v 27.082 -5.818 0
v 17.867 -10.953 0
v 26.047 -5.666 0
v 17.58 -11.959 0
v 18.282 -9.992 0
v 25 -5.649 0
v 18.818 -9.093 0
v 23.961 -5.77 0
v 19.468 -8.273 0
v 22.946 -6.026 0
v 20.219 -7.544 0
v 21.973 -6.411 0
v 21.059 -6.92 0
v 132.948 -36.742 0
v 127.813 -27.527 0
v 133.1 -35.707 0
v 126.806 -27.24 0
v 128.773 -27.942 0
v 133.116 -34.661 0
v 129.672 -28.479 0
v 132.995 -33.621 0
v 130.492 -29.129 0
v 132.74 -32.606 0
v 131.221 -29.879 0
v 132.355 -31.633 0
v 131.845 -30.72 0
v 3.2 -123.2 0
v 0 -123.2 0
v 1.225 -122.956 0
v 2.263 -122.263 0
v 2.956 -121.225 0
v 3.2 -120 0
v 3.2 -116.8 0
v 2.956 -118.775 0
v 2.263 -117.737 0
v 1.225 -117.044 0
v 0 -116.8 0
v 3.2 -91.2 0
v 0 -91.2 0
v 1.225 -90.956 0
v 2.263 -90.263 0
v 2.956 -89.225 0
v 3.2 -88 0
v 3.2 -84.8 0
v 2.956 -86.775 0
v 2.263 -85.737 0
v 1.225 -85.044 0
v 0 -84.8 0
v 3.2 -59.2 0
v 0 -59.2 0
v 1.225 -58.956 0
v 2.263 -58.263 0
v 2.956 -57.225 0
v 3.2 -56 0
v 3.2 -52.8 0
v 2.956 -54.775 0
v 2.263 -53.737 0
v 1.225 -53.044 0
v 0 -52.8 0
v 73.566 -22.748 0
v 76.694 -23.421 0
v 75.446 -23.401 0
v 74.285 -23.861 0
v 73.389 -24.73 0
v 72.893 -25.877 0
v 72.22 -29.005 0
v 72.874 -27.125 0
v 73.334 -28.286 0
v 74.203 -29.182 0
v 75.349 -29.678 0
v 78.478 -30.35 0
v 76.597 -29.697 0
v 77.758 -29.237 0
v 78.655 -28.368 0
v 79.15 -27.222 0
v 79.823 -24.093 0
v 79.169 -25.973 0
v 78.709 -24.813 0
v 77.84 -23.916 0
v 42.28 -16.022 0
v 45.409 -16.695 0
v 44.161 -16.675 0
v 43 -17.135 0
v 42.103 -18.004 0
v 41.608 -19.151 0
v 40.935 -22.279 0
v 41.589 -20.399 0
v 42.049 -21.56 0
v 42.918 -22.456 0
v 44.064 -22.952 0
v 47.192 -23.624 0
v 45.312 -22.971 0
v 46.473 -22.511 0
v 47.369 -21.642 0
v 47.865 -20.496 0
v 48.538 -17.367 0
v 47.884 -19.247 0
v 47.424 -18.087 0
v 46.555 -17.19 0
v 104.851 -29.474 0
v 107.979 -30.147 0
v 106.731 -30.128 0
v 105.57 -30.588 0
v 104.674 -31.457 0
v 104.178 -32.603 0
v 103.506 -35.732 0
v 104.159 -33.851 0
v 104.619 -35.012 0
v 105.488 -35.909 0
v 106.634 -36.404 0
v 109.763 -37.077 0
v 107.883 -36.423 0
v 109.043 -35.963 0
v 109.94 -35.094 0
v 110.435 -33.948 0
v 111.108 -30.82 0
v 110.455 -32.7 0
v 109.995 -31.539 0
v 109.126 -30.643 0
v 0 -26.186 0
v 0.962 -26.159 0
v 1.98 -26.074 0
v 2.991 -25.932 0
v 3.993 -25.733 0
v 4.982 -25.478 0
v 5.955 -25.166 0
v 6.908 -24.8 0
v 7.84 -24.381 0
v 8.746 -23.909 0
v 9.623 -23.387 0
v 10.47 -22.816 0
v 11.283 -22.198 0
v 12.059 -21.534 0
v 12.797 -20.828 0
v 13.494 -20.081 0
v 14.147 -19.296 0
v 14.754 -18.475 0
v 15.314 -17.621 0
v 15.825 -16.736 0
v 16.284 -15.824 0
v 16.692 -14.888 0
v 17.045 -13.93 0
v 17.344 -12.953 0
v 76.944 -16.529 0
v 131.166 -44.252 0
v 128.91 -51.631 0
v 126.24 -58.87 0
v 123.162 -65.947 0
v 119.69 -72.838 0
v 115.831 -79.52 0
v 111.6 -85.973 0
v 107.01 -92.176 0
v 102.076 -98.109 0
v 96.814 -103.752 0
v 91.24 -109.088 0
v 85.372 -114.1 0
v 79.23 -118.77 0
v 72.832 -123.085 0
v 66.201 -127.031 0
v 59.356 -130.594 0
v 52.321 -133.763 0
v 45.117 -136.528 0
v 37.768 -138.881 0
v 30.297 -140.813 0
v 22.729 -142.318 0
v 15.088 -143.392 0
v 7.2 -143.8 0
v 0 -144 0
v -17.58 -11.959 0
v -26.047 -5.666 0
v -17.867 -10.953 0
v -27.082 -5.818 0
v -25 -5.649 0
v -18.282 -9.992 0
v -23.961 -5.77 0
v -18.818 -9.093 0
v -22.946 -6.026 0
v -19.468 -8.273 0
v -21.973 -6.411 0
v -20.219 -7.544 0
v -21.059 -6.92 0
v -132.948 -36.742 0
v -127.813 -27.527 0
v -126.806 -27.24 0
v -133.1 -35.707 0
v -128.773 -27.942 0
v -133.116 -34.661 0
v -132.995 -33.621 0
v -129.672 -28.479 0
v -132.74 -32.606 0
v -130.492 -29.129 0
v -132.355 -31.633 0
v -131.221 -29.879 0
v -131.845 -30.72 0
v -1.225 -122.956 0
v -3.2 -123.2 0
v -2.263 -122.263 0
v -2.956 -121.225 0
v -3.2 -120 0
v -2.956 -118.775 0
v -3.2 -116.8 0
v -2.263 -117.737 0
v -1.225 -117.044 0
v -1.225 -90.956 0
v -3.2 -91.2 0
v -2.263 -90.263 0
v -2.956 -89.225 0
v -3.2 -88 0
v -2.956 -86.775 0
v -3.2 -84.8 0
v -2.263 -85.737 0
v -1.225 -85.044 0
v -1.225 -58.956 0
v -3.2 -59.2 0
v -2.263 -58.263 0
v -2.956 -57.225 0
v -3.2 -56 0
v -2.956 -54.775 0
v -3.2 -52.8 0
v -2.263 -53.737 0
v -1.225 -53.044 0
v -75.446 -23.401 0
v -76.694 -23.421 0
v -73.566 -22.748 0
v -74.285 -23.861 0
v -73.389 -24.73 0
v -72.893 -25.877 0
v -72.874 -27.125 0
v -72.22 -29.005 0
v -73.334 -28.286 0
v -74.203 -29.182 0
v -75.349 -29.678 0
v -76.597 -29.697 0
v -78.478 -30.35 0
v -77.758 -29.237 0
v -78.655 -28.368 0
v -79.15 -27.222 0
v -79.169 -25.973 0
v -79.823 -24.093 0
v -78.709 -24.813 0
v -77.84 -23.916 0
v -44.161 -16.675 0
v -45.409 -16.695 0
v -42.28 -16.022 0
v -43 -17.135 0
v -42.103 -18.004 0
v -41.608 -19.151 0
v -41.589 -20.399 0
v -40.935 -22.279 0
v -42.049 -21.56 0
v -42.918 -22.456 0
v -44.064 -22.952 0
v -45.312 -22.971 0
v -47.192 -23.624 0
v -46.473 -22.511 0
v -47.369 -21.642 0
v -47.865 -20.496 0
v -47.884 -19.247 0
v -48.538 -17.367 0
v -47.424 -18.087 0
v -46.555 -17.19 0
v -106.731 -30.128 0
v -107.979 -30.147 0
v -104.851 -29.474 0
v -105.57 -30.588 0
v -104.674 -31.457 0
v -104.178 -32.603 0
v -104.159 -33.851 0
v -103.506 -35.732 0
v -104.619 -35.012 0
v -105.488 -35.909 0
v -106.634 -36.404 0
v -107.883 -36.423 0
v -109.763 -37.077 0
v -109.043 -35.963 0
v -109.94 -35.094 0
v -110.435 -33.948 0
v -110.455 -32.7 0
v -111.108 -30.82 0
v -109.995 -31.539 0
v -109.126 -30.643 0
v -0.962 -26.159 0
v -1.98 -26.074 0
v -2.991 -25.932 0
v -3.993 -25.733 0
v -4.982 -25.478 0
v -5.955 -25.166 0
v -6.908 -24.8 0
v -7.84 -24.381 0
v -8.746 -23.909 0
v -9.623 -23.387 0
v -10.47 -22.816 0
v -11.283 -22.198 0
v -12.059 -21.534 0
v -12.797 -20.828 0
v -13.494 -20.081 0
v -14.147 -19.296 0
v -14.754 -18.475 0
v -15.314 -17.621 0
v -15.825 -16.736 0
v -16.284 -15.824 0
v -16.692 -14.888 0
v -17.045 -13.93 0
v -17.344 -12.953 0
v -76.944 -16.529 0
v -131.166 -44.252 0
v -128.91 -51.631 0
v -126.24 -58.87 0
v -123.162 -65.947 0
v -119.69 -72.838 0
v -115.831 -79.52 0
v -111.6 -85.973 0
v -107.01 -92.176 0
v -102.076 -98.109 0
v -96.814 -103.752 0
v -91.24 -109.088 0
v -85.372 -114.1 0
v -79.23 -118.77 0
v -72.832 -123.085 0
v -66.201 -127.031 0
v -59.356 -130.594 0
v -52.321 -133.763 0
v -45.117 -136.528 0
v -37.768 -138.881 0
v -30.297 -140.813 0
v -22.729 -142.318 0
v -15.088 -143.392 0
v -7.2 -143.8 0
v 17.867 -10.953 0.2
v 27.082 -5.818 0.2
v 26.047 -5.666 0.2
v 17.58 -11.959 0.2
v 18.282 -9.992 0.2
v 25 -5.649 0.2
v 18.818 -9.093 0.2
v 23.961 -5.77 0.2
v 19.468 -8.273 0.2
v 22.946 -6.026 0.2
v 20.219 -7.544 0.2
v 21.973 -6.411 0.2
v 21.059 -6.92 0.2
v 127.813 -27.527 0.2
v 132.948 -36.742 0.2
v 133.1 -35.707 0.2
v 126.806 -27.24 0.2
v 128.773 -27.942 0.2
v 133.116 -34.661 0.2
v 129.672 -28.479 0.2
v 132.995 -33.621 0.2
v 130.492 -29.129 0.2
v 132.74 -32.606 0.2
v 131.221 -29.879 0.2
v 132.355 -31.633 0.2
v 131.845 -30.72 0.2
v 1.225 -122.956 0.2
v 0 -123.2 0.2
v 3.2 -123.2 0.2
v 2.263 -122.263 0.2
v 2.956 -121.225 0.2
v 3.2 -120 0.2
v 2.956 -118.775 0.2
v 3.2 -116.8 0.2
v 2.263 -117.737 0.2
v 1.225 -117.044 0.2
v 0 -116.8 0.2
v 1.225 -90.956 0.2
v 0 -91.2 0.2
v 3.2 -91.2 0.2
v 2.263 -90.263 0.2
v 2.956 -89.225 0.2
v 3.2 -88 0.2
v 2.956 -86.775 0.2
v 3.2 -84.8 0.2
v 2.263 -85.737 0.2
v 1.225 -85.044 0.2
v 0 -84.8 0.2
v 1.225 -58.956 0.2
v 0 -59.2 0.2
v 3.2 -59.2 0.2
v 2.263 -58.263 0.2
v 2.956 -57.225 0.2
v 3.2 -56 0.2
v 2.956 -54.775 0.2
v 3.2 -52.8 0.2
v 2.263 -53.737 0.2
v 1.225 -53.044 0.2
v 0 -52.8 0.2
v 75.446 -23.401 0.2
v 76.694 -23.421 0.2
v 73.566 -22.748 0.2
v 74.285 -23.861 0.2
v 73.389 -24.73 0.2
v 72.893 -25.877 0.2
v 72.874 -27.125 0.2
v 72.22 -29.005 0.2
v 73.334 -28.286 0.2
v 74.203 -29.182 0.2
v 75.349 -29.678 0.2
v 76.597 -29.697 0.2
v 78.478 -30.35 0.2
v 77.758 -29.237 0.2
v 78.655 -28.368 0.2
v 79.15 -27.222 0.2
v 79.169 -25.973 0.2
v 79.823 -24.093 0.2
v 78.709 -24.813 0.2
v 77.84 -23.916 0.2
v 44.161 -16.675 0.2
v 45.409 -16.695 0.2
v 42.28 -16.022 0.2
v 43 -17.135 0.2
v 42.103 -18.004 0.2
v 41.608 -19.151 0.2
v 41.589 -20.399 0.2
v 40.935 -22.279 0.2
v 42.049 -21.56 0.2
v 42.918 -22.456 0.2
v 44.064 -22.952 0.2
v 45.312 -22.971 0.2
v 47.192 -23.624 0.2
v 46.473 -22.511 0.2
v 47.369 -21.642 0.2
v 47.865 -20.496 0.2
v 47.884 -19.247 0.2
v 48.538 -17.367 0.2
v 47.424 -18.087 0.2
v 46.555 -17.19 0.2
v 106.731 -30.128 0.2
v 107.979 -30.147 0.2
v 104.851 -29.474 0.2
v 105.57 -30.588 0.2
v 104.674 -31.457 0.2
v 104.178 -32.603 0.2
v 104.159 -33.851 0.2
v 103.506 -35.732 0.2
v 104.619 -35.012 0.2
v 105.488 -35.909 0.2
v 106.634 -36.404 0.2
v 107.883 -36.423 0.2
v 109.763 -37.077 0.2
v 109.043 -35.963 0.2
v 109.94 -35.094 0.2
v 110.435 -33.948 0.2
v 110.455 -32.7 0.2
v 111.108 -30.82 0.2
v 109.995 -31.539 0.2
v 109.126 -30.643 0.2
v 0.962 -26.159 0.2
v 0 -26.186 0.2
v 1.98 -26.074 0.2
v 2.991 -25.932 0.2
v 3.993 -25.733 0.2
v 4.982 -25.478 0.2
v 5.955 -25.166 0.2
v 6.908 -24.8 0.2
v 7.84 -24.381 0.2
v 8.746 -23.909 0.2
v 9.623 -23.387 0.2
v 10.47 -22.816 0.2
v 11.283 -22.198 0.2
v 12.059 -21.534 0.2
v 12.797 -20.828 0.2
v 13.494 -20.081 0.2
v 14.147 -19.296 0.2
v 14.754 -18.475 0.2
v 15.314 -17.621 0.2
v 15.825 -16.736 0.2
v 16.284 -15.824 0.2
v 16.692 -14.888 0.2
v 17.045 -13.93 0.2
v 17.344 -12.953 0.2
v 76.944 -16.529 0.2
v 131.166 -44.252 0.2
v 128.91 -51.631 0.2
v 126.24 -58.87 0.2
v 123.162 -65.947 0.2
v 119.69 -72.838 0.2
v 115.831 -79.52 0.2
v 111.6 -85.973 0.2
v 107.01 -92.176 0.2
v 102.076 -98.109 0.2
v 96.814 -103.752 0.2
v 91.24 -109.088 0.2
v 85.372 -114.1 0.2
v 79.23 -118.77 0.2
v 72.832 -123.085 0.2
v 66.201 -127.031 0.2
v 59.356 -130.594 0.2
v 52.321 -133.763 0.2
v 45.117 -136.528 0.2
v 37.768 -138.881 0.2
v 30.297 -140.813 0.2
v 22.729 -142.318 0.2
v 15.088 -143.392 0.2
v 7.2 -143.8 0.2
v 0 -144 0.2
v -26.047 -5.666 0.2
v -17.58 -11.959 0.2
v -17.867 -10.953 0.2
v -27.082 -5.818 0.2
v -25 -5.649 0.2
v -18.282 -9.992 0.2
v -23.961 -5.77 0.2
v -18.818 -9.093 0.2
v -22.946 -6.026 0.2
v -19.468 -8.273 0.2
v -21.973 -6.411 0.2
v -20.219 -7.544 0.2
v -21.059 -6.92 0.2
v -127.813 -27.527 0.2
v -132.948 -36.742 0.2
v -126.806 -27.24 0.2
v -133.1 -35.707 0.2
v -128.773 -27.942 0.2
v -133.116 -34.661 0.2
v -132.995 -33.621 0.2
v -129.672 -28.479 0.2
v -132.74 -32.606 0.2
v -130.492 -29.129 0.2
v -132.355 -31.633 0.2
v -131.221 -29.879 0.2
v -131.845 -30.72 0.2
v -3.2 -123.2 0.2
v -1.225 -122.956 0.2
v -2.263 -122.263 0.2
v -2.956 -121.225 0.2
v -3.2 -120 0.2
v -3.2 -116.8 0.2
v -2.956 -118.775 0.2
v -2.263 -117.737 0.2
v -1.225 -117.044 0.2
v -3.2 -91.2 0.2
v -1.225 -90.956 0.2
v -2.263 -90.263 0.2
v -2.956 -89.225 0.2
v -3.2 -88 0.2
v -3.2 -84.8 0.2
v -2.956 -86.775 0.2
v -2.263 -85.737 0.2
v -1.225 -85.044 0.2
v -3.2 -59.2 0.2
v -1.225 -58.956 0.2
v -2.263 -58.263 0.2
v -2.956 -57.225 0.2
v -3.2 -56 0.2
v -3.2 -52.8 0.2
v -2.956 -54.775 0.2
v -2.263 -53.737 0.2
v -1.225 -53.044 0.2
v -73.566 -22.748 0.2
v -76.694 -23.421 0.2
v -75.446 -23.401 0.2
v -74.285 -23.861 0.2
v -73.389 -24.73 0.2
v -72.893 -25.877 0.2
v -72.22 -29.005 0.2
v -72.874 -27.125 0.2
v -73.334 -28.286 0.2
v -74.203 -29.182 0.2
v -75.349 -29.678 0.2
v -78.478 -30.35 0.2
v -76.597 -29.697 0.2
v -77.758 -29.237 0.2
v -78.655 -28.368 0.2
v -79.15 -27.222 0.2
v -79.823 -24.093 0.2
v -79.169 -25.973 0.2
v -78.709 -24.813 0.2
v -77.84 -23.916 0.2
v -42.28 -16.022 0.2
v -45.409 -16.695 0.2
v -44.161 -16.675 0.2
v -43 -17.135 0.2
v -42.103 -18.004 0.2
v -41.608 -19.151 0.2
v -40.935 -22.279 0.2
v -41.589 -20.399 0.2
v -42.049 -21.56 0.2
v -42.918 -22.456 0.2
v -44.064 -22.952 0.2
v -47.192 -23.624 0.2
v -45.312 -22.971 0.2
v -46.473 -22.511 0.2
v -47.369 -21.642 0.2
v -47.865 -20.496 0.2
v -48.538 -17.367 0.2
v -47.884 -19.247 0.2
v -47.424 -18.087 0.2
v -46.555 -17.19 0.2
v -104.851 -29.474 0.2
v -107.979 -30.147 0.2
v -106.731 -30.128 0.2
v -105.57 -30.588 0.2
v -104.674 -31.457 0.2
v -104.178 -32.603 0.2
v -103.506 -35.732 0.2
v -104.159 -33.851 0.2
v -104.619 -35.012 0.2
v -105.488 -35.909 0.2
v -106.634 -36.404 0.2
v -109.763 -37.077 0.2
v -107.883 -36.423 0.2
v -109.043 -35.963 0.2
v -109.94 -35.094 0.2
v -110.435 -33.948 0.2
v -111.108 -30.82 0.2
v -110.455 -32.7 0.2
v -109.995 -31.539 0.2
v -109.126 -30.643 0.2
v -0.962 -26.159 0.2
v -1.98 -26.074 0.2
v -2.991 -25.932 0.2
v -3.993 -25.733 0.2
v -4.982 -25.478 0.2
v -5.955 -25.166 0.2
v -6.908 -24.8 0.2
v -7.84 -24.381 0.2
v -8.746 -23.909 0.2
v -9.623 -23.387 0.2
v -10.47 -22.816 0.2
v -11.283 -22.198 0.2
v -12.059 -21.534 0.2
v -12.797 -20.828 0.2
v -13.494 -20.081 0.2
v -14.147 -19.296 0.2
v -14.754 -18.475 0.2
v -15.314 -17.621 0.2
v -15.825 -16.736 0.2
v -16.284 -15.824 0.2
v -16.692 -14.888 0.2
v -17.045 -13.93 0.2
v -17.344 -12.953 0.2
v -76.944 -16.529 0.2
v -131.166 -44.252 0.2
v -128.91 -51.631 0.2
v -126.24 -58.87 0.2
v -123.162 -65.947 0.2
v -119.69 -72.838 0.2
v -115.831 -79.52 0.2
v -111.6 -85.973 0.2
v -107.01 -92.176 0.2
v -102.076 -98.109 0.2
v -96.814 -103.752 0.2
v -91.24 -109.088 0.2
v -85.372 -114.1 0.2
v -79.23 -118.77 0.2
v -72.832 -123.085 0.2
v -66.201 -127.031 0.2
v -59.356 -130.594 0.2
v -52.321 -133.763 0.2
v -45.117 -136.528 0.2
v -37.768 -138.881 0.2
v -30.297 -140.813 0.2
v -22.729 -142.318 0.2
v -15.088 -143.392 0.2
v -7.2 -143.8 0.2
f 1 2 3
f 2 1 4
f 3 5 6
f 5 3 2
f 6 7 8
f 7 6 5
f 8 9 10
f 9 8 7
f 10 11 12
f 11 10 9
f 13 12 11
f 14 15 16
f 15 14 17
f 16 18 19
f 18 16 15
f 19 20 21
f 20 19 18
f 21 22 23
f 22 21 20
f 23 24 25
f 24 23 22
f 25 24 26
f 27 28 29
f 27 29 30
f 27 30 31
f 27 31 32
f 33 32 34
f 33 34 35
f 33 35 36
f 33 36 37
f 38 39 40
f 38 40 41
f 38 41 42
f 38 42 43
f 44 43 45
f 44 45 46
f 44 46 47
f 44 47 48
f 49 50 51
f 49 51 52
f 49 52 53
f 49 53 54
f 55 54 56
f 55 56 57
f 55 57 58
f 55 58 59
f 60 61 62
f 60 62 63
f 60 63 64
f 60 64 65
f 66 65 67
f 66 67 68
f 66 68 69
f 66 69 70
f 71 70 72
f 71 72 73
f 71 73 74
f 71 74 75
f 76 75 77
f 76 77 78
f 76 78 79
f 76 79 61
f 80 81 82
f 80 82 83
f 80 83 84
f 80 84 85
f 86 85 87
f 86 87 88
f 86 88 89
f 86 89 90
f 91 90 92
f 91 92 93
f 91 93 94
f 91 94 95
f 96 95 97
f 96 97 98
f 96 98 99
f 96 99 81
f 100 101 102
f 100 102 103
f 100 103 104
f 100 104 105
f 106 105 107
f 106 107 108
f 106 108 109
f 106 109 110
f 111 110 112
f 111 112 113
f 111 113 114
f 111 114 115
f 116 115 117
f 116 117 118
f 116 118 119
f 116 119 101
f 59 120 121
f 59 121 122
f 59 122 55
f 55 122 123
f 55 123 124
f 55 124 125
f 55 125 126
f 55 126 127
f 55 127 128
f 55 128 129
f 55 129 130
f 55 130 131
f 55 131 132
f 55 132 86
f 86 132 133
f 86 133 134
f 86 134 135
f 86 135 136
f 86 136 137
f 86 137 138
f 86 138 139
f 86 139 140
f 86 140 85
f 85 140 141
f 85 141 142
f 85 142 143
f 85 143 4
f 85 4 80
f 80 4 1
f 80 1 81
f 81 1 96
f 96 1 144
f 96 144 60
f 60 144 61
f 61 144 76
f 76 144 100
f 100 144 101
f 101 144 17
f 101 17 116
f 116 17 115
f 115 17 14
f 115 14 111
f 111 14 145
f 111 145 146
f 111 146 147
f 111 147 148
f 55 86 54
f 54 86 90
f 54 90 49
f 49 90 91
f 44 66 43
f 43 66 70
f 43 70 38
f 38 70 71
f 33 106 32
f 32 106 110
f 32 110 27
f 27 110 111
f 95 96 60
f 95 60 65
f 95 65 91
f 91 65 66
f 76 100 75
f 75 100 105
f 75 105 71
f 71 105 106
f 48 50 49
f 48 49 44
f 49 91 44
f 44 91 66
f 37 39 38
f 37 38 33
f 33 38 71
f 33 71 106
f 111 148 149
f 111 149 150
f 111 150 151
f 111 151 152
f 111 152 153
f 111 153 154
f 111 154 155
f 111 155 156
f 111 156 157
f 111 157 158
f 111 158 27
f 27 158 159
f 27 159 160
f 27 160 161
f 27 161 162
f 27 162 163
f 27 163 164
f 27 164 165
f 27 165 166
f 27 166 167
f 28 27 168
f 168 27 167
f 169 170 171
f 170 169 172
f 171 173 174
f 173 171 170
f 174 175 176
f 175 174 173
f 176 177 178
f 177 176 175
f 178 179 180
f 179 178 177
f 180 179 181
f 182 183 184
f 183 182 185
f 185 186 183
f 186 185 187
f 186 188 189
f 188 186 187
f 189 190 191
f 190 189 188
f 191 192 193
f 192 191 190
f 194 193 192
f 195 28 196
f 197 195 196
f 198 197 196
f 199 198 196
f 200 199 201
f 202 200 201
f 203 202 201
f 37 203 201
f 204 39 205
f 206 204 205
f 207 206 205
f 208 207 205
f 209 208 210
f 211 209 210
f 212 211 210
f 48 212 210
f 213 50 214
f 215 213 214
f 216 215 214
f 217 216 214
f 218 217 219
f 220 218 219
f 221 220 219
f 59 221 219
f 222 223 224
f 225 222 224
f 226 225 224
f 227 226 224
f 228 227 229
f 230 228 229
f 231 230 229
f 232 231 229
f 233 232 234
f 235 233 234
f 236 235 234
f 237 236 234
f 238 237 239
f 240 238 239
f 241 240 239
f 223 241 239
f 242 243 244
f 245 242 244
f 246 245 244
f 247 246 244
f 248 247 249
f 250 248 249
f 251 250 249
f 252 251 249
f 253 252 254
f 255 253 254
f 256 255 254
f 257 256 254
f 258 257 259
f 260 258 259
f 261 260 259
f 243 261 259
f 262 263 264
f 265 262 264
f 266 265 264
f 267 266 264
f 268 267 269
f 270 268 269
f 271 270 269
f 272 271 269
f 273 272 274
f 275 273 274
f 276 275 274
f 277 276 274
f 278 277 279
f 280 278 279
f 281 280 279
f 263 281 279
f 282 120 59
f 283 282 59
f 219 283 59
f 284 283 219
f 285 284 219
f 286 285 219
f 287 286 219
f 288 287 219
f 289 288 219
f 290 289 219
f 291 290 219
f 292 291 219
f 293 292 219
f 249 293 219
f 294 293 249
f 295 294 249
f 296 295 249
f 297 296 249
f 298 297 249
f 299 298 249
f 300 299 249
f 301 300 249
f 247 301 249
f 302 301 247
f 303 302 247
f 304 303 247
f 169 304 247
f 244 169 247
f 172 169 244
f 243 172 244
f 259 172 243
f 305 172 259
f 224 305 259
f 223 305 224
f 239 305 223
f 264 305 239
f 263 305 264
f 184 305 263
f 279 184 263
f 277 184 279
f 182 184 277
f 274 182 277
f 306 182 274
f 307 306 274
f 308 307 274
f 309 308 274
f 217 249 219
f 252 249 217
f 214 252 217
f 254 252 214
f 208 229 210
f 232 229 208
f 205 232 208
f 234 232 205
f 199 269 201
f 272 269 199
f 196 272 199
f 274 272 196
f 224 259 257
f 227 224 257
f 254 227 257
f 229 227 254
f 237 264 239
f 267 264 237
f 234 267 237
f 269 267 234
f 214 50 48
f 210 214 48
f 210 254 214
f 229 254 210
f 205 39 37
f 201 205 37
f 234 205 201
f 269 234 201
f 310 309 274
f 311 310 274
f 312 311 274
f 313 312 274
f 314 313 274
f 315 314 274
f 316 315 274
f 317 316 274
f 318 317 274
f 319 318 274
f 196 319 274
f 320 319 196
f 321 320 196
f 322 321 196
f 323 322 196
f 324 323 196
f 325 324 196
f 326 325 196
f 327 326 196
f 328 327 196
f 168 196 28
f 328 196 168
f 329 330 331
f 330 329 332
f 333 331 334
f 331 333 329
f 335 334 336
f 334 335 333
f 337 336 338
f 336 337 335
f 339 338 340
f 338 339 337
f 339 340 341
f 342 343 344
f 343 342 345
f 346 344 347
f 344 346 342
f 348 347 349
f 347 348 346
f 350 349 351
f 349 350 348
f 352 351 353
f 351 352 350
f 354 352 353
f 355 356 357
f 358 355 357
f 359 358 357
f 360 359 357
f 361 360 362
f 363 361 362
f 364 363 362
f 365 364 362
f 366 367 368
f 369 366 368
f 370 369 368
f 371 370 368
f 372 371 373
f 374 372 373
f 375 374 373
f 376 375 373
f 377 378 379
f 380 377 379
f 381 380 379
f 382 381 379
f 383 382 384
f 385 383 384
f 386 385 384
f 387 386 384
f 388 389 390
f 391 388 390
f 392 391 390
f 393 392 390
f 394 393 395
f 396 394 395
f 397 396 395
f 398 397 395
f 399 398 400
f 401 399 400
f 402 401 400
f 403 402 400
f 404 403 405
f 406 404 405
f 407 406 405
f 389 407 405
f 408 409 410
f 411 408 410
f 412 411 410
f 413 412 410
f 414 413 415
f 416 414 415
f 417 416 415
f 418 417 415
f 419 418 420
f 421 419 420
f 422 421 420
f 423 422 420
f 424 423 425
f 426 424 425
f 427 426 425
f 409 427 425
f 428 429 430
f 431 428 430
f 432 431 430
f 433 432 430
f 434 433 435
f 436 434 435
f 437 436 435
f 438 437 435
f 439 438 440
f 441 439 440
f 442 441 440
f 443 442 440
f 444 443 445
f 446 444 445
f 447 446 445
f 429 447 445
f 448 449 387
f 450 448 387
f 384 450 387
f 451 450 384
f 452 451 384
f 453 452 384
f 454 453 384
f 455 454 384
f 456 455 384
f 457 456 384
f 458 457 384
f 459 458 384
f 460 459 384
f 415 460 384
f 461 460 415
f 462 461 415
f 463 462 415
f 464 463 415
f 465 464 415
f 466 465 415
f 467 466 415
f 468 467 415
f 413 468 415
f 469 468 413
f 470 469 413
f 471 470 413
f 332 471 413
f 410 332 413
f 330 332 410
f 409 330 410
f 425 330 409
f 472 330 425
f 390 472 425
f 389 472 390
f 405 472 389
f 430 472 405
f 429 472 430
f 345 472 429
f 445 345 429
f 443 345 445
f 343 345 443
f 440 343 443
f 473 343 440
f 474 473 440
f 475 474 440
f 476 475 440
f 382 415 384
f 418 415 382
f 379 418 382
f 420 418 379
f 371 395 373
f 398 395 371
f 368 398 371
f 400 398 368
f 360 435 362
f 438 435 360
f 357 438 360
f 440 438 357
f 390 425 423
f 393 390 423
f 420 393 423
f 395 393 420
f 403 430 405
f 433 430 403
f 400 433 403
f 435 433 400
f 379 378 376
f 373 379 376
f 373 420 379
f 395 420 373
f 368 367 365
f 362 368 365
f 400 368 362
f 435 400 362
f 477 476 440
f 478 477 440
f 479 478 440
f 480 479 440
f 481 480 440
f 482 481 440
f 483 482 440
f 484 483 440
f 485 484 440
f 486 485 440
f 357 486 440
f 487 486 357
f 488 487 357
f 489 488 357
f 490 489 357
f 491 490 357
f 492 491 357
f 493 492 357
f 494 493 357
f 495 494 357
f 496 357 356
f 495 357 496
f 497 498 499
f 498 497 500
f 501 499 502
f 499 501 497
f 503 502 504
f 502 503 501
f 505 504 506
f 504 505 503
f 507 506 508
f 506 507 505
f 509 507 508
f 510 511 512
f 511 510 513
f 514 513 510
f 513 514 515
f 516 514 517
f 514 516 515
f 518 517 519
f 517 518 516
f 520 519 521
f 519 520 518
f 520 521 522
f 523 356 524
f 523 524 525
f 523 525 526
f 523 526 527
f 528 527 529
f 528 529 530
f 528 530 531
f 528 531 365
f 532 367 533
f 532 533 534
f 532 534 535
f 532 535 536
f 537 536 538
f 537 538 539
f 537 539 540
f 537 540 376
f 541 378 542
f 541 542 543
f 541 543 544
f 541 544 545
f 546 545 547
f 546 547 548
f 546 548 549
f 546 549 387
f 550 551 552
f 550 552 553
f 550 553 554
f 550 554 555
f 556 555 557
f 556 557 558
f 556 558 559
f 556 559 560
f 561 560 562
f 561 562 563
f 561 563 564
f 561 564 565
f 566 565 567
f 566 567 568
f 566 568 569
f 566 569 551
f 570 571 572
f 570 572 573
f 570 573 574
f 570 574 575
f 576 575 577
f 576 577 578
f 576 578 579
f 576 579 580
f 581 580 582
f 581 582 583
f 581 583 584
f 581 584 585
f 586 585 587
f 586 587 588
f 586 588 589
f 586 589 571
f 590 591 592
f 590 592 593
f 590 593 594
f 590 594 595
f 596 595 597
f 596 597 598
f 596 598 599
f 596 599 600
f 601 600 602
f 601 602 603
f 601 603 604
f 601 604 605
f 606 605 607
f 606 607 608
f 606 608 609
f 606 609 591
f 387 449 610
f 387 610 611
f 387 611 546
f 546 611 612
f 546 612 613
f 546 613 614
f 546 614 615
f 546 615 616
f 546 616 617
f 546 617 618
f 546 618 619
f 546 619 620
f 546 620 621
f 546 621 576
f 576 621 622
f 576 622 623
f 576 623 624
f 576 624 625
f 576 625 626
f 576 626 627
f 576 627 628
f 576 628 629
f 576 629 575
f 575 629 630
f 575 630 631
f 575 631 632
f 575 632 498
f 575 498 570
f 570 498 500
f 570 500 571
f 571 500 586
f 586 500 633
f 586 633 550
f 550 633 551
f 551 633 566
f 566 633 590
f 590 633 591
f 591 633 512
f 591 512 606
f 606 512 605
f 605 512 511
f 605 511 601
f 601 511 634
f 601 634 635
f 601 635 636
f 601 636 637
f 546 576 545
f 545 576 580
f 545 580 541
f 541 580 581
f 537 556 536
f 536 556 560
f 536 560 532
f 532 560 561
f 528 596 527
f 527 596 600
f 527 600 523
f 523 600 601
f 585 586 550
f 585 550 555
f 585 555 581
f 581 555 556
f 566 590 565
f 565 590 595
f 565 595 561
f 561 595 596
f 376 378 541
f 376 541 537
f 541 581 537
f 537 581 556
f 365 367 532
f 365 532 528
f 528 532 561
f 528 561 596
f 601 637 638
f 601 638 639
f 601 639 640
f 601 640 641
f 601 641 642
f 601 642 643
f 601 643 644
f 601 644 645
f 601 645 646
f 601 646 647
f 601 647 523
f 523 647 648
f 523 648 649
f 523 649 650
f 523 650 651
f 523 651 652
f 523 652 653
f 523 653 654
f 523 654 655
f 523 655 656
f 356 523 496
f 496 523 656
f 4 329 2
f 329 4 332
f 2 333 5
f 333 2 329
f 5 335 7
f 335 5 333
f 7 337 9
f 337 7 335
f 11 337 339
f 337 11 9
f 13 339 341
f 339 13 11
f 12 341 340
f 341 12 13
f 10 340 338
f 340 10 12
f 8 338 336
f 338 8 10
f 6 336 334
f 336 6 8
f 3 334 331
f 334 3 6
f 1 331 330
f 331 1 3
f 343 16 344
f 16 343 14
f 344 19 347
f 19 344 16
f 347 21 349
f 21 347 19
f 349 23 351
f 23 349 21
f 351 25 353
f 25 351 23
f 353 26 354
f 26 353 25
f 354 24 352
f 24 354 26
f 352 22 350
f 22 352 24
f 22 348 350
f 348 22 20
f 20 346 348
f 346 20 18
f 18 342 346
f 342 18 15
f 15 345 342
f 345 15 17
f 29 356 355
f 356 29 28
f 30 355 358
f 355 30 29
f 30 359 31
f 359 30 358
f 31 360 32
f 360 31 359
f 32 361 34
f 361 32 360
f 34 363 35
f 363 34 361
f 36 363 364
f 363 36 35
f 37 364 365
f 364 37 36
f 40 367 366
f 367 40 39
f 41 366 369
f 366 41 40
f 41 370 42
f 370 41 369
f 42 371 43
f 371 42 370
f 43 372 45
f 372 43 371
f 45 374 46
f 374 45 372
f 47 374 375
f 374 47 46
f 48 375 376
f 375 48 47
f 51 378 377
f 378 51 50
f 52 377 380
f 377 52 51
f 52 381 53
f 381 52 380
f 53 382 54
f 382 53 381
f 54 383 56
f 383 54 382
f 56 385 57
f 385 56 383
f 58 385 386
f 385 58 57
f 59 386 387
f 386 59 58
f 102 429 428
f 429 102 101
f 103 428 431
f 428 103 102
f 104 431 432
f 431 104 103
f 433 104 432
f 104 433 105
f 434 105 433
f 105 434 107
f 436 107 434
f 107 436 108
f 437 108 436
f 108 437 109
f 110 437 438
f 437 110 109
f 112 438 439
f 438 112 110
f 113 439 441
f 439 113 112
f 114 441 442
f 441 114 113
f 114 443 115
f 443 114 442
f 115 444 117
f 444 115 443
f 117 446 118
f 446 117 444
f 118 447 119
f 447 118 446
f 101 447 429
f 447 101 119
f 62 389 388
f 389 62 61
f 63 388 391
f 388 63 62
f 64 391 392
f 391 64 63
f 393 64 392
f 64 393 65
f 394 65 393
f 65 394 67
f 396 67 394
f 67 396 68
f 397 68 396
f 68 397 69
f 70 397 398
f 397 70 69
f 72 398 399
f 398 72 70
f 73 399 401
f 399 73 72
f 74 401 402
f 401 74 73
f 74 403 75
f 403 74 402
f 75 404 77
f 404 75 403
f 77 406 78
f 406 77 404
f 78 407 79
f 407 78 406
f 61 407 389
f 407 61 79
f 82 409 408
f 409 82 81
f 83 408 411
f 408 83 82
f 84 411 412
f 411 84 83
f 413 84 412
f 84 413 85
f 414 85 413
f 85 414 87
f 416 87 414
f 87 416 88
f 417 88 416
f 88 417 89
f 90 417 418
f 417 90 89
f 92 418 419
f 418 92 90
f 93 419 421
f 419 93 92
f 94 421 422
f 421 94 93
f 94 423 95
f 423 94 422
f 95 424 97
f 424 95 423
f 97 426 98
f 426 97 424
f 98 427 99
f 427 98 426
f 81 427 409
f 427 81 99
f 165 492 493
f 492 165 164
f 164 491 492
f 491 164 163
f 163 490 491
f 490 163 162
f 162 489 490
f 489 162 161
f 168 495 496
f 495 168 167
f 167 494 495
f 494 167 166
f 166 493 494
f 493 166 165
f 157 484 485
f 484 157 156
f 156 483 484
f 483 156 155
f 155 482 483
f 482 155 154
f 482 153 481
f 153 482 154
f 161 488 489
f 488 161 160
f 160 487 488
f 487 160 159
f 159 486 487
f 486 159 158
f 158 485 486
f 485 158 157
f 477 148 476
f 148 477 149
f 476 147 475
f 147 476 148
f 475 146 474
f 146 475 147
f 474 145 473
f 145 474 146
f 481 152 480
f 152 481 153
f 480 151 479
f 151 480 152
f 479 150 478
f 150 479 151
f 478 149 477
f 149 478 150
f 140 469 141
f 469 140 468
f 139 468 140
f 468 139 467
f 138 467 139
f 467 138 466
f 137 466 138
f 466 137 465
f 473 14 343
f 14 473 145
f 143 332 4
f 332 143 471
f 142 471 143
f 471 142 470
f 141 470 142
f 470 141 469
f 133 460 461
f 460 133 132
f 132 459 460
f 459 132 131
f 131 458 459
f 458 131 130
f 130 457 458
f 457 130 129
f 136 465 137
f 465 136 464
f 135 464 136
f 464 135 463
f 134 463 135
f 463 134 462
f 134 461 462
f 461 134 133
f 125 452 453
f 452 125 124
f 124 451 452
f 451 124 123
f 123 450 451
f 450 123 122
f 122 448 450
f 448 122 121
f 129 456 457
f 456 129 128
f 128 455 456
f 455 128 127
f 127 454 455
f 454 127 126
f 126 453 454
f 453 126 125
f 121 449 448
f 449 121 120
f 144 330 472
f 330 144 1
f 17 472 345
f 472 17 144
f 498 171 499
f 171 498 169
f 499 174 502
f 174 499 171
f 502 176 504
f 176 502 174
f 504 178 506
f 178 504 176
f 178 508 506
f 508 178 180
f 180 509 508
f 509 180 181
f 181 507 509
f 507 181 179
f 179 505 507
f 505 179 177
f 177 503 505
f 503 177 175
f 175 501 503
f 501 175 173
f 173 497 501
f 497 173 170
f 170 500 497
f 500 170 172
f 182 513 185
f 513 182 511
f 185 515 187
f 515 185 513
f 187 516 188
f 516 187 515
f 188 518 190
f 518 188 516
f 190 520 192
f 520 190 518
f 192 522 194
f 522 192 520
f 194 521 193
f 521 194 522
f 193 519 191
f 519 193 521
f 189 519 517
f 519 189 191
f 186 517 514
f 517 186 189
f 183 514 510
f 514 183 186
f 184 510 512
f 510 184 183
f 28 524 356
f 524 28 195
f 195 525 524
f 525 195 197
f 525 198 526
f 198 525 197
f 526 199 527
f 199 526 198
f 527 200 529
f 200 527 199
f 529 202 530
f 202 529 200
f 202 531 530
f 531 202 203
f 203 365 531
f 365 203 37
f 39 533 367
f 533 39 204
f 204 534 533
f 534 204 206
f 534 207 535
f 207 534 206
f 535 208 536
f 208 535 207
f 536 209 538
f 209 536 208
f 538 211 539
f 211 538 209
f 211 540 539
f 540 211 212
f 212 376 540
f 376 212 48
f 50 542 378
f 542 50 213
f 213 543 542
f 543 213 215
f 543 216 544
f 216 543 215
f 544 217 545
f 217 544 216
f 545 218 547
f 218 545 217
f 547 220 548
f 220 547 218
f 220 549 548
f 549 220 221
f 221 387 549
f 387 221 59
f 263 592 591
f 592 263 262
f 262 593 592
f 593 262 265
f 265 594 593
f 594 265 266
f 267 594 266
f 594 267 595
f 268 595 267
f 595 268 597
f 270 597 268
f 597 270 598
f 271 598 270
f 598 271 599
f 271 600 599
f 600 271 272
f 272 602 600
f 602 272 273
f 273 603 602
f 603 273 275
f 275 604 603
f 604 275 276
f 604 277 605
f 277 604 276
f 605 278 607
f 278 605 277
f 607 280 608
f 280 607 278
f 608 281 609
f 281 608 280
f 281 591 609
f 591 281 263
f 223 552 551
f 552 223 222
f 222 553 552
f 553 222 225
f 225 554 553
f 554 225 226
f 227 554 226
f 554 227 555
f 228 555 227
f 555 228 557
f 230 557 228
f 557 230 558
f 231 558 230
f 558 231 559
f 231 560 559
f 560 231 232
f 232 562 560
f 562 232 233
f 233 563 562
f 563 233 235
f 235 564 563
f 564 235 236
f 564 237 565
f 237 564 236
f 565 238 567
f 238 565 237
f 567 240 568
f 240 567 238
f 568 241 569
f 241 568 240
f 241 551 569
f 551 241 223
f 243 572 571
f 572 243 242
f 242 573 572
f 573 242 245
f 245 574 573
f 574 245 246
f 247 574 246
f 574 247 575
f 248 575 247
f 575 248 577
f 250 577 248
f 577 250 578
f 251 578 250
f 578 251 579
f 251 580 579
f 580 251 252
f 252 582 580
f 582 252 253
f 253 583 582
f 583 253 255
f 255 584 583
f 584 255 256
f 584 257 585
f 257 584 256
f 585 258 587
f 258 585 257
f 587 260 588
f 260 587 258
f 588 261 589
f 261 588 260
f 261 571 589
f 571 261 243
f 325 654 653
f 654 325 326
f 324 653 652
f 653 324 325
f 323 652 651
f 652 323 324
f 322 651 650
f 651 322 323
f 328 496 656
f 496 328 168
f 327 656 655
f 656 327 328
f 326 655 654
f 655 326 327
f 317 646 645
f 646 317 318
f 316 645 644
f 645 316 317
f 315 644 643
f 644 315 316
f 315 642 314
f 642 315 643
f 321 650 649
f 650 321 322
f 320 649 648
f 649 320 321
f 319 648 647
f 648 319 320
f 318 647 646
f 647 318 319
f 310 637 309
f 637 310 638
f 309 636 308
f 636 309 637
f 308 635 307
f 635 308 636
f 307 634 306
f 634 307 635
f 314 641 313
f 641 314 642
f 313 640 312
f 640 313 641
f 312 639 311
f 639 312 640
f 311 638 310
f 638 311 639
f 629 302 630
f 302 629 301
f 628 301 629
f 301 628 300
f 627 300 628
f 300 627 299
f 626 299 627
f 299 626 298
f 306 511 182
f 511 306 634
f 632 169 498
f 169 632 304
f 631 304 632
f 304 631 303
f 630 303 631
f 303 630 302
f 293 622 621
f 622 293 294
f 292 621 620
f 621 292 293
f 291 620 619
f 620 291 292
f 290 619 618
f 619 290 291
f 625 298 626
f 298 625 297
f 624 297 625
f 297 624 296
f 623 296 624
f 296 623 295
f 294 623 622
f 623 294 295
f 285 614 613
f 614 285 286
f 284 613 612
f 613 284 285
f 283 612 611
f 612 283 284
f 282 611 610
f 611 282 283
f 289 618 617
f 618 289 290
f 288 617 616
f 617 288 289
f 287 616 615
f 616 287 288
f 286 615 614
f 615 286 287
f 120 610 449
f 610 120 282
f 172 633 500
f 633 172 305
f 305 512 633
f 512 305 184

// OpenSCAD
use <../lib.scad>
use <../p/48/11-24edge.scad>
use <../p/48/19-48edge.scad>
use <s/u9328as01.scad>
use <s/u9328as02.scad>
function ldraw_lib__u9328a() = [
// 0 Sheet Fabric Tepee Cover
// 0 Name: u9328a.dat
// 0 Author: Alex Taylor [anathema]
// 0 !LDRAW_ORG Part UPDATE 2024-10
// 0 !LICENSE Licensed under CC BY 4.0 : see CAreadme.txt
// 
// 0 BFC CERTIFY CCW
  [0,"BFC","CERTIFY"],
  [0,"BFC","CCW"],
// 
// 0 !CATEGORY Sheet Fabric
// 
// 0 !HISTORY 2024-05-18 [Holly-Wood] Split sub in half
// 0 !HISTORY 2024-12-01 [OrionP] Official Update 2024-10
// 
// 1 16 0 0 0 1 0 0 0 1 0 0 0 1 s\u9328as01.dat
  [1,16,0,0,0,1,0,0,0,1,0,0,0,1, ldraw_lib__s__u9328as01()],
// 1 16 0 0 0 -1 0 0 0 1 0 0 0 1 s\u9328as01.dat
  [1,16,0,0,0,-1,0,0,0,1,0,0,0,1, ldraw_lib__s__u9328as01()],
// 
// 1 16 0 -0.5 0 1 0 0 0 -1 0 0 0 1 s\u9328as01.dat
  [1,16,0,-0.5,0,1,0,0,0,-1,0,0,0,1, ldraw_lib__s__u9328as01()],
// 1 16 0 -0.5 0 -1 0 0 0 -1 0 0 0 1 s\u9328as01.dat
  [1,16,0,-0.5,0,-1,0,0,0,-1,0,0,0,1, ldraw_lib__s__u9328as01()],
// 
// 1 16 0 0 0 1 0 0 0 1 0 0 0 1 s\u9328as02.dat
  [1,16,0,0,0,1,0,0,0,1,0,0,0,1, ldraw_lib__s__u9328as02()],
// 1 16 0 0 0 -1 0 0 0 1 0 0 0 1 s\u9328as02.dat
  [1,16,0,0,0,-1,0,0,0,1,0,0,0,1, ldraw_lib__s__u9328as02()],
// 
// 0 // Edges for flap
// 1 16 159.9 0 -223.2 34.9716 0 28.31941 0 1 0 -28.31941 0 34.9716 48\19-48edge.dat
  [1,16,159.9,0,-223.2,34.9716,0,28.31941,0,1,0,-28.31941,0,34.9716, ldraw_lib__48__19_48edge()],
// 1 16 159.9 0 -223.2 -41.10955 0 -18.30318 0 1 0 18.30318 0 -41.10955 48\11-24edge.dat
  [1,16,159.9,0,-223.2,-41.10955,0,-18.30318,0,1,0,18.30318,0,-41.10955, ldraw_lib__48__11_24edge()],
// 1 16 159.9 -.5 -223.2 34.9716 0 28.31941 0 1 0 -28.31941 0 34.9716 48\19-48edge.dat
  [1,16,159.9,-.5,-223.2,34.9716,0,28.31941,0,1,0,-28.31941,0,34.9716, ldraw_lib__48__19_48edge()],
// 1 16 159.9 -.5 -223.2 -41.10955 0 -18.30318 0 1 0 18.30318 0 -41.10955 48\11-24edge.dat
  [1,16,159.9,-.5,-223.2,-41.10955,0,-18.30318,0,1,0,18.30318,0,-41.10955, ldraw_lib__48__11_24edge()],
];
module ldraw_lib__u9328a(step=0, col=false, unit=2/5, alt=false, line=0.2, solid=!$preview)
    makepoly(ldraw_lib__u9328a(), step=step, col=col, unit=unit, alt=alt, line=line, solid=solid);
ldraw_lib__u9328a(line=0.2);
